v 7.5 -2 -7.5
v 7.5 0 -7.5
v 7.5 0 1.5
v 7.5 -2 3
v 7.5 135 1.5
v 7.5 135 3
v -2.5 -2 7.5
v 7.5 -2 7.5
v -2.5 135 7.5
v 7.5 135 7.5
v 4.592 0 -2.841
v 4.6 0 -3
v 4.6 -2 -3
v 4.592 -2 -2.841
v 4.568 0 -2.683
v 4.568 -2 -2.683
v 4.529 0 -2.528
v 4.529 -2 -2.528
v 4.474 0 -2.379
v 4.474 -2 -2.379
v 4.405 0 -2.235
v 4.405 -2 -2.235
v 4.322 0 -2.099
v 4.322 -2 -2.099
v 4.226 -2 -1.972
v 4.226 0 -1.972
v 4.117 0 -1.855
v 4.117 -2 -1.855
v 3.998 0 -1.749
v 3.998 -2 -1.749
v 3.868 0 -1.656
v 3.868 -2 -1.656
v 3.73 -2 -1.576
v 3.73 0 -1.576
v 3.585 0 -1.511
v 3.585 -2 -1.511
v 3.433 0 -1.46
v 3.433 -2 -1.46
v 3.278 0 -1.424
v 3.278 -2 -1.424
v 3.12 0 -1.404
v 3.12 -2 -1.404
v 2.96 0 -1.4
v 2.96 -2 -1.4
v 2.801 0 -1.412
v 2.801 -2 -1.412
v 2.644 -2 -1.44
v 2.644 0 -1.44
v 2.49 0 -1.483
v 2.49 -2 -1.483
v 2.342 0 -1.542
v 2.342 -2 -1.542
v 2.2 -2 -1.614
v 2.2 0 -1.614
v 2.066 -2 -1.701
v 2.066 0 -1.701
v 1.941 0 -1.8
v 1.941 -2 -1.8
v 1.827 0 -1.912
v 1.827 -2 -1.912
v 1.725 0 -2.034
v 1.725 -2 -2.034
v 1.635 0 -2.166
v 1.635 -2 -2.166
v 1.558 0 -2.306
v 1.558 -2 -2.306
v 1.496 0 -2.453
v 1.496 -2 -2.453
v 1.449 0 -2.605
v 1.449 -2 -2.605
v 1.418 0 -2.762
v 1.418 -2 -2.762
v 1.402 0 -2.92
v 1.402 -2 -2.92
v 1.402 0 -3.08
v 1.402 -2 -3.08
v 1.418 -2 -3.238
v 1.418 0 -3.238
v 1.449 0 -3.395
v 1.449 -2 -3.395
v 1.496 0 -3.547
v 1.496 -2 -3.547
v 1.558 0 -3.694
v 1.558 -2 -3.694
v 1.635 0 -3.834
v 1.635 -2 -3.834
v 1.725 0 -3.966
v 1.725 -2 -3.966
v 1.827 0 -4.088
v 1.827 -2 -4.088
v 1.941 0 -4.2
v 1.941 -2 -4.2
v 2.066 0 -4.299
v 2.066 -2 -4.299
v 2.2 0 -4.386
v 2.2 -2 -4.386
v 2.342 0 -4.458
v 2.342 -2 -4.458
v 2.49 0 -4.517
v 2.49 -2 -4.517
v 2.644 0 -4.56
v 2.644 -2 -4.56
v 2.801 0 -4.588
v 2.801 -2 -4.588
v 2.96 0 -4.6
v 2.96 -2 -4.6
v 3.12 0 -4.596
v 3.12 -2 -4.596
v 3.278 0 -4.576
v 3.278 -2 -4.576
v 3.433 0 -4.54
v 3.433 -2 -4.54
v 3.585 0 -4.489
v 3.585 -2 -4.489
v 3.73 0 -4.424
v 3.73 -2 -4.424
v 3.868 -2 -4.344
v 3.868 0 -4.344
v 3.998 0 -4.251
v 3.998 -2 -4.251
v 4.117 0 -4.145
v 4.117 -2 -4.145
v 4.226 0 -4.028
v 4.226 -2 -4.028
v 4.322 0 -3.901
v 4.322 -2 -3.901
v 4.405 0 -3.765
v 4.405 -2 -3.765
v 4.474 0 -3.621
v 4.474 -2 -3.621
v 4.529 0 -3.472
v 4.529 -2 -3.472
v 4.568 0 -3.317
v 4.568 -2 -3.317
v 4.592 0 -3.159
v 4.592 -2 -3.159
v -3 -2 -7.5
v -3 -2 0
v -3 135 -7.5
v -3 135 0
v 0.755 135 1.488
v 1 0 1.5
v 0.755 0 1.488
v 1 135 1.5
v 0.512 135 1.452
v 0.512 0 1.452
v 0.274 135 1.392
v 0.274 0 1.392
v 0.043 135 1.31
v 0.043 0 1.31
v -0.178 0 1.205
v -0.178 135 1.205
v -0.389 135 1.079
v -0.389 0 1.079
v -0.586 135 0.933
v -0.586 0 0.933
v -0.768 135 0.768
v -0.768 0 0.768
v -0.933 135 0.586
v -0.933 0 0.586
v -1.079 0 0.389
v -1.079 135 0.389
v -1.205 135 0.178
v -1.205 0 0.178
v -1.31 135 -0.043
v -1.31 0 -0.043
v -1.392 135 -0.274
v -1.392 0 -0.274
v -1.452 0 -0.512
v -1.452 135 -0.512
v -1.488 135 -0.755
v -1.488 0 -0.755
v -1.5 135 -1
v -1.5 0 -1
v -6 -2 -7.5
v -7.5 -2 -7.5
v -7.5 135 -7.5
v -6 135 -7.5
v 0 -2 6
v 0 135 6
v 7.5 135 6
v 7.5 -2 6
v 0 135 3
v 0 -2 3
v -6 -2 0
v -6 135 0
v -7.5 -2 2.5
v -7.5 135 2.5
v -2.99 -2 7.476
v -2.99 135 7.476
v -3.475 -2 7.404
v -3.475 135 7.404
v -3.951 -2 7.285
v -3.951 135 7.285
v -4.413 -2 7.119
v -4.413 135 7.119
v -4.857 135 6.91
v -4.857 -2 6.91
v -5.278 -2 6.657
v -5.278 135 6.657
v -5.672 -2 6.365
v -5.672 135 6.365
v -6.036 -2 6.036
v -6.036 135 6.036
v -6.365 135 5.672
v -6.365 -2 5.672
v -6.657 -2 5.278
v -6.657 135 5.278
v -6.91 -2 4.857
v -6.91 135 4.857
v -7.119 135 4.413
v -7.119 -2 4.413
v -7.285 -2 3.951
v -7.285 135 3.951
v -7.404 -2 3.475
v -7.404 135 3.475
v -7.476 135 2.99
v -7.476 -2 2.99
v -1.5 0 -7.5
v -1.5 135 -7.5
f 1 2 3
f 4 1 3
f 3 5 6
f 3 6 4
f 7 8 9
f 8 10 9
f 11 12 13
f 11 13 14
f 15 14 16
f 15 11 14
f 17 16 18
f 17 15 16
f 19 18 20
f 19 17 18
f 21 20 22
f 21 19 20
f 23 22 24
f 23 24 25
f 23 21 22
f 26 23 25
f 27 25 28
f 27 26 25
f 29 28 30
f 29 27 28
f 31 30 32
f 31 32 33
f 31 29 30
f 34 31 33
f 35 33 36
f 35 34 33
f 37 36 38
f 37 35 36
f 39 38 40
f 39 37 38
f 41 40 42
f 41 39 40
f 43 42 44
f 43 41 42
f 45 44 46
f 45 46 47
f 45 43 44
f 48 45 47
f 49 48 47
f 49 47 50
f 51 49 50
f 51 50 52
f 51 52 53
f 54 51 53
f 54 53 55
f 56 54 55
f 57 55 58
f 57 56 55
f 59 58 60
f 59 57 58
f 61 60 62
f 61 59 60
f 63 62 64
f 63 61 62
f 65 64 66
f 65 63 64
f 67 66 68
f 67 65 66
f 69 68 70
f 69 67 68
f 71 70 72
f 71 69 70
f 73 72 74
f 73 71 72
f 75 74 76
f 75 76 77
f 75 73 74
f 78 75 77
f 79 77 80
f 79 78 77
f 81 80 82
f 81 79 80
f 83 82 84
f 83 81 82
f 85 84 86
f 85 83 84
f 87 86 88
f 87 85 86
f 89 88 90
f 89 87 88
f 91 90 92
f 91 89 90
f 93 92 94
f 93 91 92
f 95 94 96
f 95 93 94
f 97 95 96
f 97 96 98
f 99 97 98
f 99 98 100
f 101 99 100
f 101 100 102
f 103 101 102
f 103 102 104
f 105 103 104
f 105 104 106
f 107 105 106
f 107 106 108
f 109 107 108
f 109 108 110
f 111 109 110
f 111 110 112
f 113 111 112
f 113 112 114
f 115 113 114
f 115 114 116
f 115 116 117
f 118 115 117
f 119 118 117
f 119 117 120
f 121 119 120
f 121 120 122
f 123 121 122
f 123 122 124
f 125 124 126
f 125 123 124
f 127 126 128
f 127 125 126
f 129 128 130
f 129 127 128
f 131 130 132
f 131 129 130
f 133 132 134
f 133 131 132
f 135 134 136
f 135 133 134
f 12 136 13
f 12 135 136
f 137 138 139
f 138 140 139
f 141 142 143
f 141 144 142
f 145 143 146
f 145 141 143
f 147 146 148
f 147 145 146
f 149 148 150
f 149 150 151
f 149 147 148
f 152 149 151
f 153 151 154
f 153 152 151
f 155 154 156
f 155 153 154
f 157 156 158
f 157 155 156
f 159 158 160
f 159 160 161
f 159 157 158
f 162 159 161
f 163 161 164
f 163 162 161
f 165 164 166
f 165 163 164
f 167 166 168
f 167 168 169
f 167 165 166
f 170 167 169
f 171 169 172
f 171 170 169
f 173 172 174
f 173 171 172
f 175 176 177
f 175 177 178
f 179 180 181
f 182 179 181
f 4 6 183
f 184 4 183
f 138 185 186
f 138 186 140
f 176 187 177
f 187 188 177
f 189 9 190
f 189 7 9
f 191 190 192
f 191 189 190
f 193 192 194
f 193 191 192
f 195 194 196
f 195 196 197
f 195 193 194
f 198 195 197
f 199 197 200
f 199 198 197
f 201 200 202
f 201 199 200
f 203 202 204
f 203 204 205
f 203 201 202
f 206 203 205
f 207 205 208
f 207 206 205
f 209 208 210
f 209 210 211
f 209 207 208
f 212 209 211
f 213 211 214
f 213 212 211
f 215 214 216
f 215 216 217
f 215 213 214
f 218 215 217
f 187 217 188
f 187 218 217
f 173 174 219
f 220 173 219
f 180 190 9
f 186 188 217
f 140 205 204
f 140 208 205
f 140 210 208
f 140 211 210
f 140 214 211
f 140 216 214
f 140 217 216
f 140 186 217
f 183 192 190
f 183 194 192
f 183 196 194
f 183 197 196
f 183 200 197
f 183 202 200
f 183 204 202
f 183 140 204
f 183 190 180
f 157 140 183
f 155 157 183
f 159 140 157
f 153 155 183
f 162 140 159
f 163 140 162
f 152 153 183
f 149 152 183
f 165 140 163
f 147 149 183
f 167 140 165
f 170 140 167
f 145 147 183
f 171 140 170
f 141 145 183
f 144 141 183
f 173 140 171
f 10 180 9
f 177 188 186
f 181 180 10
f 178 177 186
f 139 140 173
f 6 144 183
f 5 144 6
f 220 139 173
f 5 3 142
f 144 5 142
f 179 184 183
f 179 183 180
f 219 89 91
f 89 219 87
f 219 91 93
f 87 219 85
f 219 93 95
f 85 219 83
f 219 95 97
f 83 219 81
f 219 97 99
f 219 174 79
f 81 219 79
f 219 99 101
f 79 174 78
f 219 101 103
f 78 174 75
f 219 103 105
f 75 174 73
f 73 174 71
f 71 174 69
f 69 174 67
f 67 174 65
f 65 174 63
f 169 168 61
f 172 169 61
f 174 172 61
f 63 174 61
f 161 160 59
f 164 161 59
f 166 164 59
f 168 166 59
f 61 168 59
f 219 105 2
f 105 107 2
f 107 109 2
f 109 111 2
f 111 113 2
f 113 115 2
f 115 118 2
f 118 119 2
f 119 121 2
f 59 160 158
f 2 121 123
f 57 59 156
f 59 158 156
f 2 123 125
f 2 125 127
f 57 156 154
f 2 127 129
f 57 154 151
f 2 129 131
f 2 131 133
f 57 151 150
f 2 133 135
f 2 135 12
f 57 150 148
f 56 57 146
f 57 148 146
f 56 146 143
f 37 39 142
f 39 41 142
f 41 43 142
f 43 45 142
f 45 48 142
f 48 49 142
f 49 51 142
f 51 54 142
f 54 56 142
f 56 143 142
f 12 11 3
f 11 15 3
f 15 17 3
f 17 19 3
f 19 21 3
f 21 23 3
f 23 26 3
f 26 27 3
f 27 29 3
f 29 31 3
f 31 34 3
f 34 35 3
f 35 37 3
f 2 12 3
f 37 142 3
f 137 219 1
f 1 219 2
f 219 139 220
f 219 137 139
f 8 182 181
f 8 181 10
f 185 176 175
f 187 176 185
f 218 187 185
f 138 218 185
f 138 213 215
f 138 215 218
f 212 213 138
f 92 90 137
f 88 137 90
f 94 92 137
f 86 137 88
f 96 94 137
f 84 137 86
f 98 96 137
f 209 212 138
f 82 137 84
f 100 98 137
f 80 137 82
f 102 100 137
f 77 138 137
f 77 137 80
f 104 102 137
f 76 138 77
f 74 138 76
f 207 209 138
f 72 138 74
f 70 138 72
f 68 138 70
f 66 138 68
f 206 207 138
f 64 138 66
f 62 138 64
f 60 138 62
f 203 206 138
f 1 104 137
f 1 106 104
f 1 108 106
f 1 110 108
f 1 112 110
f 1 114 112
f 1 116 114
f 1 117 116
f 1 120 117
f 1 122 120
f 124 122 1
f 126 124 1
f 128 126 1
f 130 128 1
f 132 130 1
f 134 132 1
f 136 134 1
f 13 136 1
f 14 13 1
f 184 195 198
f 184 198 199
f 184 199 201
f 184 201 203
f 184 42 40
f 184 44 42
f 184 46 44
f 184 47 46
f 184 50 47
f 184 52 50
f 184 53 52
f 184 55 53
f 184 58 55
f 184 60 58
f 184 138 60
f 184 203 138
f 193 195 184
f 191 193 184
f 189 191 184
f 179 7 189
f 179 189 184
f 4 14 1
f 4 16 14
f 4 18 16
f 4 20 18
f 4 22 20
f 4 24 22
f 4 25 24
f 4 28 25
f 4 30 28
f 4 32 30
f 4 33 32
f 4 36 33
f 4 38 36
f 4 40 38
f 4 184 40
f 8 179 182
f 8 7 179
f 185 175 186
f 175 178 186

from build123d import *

# Parameters (mm, degrees)
BOSS_EXTRUDE1_DEPTH = 135
SKETCH6_R           = 1.6
BOSS_EXTRUDE2_DEPTH = 2
FILLET3_R           = 5
FILLET4_R           = 2.5


with BuildPart() as part:
    # Sketch4 → Boss-Extrude1 (new body)
    with BuildSketch(Plane(origin=(0, 0, 0), x_dir=(1, 0, 0), z_dir=(0, 1, 0))):
        Polygon((-7.5, -7.5), (7.5, -7.5), (7.5, -6), (0, -6), (0, -3), (7.5, -3), (7.5, -1.5), (-1.5, -1.5), (-1.5, 7.5), (-3, 7.5), (-3, 0), (-6, 0), (-6, 7.5), (-7.5, 7.5), align=None)
    extrude(amount=BOSS_EXTRUDE1_DEPTH)

    # Sketch6 → Boss-Extrude2 (add)
    with BuildSketch(Plane.XZ):
        Polygon((7.5, 7.5), (-7.5, 7.5), (-7.5, -7.5), (-6, -7.5), (-6, 0), (-3, 0), (-3, -7.5), (-1.5, -7.5), (7.5, -7.5), (7.5, 1.5), (7.5, 3), (0, 3), (0, 6), (7.5, 6), align=None)
        with Locations((3, -3)):
            Circle(SKETCH6_R, mode=Mode.SUBTRACT)
    extrude(amount=BOSS_EXTRUDE2_DEPTH)

    # Fillet3
    fillet3_edges = [part.edges().sort_by_distance(p)[0] for p in [
        (-7.5, 66.5, 7.5),
    ]]
    fillet(fillet3_edges, radius=FILLET3_R)

    # Fillet4
    fillet4_edges = [part.edges().sort_by_distance(p)[0] for p in [
        (-1.5, 67.5, 1.5),
    ]]
    fillet(fillet4_edges, radius=FILLET4_R)


solid = part.part
